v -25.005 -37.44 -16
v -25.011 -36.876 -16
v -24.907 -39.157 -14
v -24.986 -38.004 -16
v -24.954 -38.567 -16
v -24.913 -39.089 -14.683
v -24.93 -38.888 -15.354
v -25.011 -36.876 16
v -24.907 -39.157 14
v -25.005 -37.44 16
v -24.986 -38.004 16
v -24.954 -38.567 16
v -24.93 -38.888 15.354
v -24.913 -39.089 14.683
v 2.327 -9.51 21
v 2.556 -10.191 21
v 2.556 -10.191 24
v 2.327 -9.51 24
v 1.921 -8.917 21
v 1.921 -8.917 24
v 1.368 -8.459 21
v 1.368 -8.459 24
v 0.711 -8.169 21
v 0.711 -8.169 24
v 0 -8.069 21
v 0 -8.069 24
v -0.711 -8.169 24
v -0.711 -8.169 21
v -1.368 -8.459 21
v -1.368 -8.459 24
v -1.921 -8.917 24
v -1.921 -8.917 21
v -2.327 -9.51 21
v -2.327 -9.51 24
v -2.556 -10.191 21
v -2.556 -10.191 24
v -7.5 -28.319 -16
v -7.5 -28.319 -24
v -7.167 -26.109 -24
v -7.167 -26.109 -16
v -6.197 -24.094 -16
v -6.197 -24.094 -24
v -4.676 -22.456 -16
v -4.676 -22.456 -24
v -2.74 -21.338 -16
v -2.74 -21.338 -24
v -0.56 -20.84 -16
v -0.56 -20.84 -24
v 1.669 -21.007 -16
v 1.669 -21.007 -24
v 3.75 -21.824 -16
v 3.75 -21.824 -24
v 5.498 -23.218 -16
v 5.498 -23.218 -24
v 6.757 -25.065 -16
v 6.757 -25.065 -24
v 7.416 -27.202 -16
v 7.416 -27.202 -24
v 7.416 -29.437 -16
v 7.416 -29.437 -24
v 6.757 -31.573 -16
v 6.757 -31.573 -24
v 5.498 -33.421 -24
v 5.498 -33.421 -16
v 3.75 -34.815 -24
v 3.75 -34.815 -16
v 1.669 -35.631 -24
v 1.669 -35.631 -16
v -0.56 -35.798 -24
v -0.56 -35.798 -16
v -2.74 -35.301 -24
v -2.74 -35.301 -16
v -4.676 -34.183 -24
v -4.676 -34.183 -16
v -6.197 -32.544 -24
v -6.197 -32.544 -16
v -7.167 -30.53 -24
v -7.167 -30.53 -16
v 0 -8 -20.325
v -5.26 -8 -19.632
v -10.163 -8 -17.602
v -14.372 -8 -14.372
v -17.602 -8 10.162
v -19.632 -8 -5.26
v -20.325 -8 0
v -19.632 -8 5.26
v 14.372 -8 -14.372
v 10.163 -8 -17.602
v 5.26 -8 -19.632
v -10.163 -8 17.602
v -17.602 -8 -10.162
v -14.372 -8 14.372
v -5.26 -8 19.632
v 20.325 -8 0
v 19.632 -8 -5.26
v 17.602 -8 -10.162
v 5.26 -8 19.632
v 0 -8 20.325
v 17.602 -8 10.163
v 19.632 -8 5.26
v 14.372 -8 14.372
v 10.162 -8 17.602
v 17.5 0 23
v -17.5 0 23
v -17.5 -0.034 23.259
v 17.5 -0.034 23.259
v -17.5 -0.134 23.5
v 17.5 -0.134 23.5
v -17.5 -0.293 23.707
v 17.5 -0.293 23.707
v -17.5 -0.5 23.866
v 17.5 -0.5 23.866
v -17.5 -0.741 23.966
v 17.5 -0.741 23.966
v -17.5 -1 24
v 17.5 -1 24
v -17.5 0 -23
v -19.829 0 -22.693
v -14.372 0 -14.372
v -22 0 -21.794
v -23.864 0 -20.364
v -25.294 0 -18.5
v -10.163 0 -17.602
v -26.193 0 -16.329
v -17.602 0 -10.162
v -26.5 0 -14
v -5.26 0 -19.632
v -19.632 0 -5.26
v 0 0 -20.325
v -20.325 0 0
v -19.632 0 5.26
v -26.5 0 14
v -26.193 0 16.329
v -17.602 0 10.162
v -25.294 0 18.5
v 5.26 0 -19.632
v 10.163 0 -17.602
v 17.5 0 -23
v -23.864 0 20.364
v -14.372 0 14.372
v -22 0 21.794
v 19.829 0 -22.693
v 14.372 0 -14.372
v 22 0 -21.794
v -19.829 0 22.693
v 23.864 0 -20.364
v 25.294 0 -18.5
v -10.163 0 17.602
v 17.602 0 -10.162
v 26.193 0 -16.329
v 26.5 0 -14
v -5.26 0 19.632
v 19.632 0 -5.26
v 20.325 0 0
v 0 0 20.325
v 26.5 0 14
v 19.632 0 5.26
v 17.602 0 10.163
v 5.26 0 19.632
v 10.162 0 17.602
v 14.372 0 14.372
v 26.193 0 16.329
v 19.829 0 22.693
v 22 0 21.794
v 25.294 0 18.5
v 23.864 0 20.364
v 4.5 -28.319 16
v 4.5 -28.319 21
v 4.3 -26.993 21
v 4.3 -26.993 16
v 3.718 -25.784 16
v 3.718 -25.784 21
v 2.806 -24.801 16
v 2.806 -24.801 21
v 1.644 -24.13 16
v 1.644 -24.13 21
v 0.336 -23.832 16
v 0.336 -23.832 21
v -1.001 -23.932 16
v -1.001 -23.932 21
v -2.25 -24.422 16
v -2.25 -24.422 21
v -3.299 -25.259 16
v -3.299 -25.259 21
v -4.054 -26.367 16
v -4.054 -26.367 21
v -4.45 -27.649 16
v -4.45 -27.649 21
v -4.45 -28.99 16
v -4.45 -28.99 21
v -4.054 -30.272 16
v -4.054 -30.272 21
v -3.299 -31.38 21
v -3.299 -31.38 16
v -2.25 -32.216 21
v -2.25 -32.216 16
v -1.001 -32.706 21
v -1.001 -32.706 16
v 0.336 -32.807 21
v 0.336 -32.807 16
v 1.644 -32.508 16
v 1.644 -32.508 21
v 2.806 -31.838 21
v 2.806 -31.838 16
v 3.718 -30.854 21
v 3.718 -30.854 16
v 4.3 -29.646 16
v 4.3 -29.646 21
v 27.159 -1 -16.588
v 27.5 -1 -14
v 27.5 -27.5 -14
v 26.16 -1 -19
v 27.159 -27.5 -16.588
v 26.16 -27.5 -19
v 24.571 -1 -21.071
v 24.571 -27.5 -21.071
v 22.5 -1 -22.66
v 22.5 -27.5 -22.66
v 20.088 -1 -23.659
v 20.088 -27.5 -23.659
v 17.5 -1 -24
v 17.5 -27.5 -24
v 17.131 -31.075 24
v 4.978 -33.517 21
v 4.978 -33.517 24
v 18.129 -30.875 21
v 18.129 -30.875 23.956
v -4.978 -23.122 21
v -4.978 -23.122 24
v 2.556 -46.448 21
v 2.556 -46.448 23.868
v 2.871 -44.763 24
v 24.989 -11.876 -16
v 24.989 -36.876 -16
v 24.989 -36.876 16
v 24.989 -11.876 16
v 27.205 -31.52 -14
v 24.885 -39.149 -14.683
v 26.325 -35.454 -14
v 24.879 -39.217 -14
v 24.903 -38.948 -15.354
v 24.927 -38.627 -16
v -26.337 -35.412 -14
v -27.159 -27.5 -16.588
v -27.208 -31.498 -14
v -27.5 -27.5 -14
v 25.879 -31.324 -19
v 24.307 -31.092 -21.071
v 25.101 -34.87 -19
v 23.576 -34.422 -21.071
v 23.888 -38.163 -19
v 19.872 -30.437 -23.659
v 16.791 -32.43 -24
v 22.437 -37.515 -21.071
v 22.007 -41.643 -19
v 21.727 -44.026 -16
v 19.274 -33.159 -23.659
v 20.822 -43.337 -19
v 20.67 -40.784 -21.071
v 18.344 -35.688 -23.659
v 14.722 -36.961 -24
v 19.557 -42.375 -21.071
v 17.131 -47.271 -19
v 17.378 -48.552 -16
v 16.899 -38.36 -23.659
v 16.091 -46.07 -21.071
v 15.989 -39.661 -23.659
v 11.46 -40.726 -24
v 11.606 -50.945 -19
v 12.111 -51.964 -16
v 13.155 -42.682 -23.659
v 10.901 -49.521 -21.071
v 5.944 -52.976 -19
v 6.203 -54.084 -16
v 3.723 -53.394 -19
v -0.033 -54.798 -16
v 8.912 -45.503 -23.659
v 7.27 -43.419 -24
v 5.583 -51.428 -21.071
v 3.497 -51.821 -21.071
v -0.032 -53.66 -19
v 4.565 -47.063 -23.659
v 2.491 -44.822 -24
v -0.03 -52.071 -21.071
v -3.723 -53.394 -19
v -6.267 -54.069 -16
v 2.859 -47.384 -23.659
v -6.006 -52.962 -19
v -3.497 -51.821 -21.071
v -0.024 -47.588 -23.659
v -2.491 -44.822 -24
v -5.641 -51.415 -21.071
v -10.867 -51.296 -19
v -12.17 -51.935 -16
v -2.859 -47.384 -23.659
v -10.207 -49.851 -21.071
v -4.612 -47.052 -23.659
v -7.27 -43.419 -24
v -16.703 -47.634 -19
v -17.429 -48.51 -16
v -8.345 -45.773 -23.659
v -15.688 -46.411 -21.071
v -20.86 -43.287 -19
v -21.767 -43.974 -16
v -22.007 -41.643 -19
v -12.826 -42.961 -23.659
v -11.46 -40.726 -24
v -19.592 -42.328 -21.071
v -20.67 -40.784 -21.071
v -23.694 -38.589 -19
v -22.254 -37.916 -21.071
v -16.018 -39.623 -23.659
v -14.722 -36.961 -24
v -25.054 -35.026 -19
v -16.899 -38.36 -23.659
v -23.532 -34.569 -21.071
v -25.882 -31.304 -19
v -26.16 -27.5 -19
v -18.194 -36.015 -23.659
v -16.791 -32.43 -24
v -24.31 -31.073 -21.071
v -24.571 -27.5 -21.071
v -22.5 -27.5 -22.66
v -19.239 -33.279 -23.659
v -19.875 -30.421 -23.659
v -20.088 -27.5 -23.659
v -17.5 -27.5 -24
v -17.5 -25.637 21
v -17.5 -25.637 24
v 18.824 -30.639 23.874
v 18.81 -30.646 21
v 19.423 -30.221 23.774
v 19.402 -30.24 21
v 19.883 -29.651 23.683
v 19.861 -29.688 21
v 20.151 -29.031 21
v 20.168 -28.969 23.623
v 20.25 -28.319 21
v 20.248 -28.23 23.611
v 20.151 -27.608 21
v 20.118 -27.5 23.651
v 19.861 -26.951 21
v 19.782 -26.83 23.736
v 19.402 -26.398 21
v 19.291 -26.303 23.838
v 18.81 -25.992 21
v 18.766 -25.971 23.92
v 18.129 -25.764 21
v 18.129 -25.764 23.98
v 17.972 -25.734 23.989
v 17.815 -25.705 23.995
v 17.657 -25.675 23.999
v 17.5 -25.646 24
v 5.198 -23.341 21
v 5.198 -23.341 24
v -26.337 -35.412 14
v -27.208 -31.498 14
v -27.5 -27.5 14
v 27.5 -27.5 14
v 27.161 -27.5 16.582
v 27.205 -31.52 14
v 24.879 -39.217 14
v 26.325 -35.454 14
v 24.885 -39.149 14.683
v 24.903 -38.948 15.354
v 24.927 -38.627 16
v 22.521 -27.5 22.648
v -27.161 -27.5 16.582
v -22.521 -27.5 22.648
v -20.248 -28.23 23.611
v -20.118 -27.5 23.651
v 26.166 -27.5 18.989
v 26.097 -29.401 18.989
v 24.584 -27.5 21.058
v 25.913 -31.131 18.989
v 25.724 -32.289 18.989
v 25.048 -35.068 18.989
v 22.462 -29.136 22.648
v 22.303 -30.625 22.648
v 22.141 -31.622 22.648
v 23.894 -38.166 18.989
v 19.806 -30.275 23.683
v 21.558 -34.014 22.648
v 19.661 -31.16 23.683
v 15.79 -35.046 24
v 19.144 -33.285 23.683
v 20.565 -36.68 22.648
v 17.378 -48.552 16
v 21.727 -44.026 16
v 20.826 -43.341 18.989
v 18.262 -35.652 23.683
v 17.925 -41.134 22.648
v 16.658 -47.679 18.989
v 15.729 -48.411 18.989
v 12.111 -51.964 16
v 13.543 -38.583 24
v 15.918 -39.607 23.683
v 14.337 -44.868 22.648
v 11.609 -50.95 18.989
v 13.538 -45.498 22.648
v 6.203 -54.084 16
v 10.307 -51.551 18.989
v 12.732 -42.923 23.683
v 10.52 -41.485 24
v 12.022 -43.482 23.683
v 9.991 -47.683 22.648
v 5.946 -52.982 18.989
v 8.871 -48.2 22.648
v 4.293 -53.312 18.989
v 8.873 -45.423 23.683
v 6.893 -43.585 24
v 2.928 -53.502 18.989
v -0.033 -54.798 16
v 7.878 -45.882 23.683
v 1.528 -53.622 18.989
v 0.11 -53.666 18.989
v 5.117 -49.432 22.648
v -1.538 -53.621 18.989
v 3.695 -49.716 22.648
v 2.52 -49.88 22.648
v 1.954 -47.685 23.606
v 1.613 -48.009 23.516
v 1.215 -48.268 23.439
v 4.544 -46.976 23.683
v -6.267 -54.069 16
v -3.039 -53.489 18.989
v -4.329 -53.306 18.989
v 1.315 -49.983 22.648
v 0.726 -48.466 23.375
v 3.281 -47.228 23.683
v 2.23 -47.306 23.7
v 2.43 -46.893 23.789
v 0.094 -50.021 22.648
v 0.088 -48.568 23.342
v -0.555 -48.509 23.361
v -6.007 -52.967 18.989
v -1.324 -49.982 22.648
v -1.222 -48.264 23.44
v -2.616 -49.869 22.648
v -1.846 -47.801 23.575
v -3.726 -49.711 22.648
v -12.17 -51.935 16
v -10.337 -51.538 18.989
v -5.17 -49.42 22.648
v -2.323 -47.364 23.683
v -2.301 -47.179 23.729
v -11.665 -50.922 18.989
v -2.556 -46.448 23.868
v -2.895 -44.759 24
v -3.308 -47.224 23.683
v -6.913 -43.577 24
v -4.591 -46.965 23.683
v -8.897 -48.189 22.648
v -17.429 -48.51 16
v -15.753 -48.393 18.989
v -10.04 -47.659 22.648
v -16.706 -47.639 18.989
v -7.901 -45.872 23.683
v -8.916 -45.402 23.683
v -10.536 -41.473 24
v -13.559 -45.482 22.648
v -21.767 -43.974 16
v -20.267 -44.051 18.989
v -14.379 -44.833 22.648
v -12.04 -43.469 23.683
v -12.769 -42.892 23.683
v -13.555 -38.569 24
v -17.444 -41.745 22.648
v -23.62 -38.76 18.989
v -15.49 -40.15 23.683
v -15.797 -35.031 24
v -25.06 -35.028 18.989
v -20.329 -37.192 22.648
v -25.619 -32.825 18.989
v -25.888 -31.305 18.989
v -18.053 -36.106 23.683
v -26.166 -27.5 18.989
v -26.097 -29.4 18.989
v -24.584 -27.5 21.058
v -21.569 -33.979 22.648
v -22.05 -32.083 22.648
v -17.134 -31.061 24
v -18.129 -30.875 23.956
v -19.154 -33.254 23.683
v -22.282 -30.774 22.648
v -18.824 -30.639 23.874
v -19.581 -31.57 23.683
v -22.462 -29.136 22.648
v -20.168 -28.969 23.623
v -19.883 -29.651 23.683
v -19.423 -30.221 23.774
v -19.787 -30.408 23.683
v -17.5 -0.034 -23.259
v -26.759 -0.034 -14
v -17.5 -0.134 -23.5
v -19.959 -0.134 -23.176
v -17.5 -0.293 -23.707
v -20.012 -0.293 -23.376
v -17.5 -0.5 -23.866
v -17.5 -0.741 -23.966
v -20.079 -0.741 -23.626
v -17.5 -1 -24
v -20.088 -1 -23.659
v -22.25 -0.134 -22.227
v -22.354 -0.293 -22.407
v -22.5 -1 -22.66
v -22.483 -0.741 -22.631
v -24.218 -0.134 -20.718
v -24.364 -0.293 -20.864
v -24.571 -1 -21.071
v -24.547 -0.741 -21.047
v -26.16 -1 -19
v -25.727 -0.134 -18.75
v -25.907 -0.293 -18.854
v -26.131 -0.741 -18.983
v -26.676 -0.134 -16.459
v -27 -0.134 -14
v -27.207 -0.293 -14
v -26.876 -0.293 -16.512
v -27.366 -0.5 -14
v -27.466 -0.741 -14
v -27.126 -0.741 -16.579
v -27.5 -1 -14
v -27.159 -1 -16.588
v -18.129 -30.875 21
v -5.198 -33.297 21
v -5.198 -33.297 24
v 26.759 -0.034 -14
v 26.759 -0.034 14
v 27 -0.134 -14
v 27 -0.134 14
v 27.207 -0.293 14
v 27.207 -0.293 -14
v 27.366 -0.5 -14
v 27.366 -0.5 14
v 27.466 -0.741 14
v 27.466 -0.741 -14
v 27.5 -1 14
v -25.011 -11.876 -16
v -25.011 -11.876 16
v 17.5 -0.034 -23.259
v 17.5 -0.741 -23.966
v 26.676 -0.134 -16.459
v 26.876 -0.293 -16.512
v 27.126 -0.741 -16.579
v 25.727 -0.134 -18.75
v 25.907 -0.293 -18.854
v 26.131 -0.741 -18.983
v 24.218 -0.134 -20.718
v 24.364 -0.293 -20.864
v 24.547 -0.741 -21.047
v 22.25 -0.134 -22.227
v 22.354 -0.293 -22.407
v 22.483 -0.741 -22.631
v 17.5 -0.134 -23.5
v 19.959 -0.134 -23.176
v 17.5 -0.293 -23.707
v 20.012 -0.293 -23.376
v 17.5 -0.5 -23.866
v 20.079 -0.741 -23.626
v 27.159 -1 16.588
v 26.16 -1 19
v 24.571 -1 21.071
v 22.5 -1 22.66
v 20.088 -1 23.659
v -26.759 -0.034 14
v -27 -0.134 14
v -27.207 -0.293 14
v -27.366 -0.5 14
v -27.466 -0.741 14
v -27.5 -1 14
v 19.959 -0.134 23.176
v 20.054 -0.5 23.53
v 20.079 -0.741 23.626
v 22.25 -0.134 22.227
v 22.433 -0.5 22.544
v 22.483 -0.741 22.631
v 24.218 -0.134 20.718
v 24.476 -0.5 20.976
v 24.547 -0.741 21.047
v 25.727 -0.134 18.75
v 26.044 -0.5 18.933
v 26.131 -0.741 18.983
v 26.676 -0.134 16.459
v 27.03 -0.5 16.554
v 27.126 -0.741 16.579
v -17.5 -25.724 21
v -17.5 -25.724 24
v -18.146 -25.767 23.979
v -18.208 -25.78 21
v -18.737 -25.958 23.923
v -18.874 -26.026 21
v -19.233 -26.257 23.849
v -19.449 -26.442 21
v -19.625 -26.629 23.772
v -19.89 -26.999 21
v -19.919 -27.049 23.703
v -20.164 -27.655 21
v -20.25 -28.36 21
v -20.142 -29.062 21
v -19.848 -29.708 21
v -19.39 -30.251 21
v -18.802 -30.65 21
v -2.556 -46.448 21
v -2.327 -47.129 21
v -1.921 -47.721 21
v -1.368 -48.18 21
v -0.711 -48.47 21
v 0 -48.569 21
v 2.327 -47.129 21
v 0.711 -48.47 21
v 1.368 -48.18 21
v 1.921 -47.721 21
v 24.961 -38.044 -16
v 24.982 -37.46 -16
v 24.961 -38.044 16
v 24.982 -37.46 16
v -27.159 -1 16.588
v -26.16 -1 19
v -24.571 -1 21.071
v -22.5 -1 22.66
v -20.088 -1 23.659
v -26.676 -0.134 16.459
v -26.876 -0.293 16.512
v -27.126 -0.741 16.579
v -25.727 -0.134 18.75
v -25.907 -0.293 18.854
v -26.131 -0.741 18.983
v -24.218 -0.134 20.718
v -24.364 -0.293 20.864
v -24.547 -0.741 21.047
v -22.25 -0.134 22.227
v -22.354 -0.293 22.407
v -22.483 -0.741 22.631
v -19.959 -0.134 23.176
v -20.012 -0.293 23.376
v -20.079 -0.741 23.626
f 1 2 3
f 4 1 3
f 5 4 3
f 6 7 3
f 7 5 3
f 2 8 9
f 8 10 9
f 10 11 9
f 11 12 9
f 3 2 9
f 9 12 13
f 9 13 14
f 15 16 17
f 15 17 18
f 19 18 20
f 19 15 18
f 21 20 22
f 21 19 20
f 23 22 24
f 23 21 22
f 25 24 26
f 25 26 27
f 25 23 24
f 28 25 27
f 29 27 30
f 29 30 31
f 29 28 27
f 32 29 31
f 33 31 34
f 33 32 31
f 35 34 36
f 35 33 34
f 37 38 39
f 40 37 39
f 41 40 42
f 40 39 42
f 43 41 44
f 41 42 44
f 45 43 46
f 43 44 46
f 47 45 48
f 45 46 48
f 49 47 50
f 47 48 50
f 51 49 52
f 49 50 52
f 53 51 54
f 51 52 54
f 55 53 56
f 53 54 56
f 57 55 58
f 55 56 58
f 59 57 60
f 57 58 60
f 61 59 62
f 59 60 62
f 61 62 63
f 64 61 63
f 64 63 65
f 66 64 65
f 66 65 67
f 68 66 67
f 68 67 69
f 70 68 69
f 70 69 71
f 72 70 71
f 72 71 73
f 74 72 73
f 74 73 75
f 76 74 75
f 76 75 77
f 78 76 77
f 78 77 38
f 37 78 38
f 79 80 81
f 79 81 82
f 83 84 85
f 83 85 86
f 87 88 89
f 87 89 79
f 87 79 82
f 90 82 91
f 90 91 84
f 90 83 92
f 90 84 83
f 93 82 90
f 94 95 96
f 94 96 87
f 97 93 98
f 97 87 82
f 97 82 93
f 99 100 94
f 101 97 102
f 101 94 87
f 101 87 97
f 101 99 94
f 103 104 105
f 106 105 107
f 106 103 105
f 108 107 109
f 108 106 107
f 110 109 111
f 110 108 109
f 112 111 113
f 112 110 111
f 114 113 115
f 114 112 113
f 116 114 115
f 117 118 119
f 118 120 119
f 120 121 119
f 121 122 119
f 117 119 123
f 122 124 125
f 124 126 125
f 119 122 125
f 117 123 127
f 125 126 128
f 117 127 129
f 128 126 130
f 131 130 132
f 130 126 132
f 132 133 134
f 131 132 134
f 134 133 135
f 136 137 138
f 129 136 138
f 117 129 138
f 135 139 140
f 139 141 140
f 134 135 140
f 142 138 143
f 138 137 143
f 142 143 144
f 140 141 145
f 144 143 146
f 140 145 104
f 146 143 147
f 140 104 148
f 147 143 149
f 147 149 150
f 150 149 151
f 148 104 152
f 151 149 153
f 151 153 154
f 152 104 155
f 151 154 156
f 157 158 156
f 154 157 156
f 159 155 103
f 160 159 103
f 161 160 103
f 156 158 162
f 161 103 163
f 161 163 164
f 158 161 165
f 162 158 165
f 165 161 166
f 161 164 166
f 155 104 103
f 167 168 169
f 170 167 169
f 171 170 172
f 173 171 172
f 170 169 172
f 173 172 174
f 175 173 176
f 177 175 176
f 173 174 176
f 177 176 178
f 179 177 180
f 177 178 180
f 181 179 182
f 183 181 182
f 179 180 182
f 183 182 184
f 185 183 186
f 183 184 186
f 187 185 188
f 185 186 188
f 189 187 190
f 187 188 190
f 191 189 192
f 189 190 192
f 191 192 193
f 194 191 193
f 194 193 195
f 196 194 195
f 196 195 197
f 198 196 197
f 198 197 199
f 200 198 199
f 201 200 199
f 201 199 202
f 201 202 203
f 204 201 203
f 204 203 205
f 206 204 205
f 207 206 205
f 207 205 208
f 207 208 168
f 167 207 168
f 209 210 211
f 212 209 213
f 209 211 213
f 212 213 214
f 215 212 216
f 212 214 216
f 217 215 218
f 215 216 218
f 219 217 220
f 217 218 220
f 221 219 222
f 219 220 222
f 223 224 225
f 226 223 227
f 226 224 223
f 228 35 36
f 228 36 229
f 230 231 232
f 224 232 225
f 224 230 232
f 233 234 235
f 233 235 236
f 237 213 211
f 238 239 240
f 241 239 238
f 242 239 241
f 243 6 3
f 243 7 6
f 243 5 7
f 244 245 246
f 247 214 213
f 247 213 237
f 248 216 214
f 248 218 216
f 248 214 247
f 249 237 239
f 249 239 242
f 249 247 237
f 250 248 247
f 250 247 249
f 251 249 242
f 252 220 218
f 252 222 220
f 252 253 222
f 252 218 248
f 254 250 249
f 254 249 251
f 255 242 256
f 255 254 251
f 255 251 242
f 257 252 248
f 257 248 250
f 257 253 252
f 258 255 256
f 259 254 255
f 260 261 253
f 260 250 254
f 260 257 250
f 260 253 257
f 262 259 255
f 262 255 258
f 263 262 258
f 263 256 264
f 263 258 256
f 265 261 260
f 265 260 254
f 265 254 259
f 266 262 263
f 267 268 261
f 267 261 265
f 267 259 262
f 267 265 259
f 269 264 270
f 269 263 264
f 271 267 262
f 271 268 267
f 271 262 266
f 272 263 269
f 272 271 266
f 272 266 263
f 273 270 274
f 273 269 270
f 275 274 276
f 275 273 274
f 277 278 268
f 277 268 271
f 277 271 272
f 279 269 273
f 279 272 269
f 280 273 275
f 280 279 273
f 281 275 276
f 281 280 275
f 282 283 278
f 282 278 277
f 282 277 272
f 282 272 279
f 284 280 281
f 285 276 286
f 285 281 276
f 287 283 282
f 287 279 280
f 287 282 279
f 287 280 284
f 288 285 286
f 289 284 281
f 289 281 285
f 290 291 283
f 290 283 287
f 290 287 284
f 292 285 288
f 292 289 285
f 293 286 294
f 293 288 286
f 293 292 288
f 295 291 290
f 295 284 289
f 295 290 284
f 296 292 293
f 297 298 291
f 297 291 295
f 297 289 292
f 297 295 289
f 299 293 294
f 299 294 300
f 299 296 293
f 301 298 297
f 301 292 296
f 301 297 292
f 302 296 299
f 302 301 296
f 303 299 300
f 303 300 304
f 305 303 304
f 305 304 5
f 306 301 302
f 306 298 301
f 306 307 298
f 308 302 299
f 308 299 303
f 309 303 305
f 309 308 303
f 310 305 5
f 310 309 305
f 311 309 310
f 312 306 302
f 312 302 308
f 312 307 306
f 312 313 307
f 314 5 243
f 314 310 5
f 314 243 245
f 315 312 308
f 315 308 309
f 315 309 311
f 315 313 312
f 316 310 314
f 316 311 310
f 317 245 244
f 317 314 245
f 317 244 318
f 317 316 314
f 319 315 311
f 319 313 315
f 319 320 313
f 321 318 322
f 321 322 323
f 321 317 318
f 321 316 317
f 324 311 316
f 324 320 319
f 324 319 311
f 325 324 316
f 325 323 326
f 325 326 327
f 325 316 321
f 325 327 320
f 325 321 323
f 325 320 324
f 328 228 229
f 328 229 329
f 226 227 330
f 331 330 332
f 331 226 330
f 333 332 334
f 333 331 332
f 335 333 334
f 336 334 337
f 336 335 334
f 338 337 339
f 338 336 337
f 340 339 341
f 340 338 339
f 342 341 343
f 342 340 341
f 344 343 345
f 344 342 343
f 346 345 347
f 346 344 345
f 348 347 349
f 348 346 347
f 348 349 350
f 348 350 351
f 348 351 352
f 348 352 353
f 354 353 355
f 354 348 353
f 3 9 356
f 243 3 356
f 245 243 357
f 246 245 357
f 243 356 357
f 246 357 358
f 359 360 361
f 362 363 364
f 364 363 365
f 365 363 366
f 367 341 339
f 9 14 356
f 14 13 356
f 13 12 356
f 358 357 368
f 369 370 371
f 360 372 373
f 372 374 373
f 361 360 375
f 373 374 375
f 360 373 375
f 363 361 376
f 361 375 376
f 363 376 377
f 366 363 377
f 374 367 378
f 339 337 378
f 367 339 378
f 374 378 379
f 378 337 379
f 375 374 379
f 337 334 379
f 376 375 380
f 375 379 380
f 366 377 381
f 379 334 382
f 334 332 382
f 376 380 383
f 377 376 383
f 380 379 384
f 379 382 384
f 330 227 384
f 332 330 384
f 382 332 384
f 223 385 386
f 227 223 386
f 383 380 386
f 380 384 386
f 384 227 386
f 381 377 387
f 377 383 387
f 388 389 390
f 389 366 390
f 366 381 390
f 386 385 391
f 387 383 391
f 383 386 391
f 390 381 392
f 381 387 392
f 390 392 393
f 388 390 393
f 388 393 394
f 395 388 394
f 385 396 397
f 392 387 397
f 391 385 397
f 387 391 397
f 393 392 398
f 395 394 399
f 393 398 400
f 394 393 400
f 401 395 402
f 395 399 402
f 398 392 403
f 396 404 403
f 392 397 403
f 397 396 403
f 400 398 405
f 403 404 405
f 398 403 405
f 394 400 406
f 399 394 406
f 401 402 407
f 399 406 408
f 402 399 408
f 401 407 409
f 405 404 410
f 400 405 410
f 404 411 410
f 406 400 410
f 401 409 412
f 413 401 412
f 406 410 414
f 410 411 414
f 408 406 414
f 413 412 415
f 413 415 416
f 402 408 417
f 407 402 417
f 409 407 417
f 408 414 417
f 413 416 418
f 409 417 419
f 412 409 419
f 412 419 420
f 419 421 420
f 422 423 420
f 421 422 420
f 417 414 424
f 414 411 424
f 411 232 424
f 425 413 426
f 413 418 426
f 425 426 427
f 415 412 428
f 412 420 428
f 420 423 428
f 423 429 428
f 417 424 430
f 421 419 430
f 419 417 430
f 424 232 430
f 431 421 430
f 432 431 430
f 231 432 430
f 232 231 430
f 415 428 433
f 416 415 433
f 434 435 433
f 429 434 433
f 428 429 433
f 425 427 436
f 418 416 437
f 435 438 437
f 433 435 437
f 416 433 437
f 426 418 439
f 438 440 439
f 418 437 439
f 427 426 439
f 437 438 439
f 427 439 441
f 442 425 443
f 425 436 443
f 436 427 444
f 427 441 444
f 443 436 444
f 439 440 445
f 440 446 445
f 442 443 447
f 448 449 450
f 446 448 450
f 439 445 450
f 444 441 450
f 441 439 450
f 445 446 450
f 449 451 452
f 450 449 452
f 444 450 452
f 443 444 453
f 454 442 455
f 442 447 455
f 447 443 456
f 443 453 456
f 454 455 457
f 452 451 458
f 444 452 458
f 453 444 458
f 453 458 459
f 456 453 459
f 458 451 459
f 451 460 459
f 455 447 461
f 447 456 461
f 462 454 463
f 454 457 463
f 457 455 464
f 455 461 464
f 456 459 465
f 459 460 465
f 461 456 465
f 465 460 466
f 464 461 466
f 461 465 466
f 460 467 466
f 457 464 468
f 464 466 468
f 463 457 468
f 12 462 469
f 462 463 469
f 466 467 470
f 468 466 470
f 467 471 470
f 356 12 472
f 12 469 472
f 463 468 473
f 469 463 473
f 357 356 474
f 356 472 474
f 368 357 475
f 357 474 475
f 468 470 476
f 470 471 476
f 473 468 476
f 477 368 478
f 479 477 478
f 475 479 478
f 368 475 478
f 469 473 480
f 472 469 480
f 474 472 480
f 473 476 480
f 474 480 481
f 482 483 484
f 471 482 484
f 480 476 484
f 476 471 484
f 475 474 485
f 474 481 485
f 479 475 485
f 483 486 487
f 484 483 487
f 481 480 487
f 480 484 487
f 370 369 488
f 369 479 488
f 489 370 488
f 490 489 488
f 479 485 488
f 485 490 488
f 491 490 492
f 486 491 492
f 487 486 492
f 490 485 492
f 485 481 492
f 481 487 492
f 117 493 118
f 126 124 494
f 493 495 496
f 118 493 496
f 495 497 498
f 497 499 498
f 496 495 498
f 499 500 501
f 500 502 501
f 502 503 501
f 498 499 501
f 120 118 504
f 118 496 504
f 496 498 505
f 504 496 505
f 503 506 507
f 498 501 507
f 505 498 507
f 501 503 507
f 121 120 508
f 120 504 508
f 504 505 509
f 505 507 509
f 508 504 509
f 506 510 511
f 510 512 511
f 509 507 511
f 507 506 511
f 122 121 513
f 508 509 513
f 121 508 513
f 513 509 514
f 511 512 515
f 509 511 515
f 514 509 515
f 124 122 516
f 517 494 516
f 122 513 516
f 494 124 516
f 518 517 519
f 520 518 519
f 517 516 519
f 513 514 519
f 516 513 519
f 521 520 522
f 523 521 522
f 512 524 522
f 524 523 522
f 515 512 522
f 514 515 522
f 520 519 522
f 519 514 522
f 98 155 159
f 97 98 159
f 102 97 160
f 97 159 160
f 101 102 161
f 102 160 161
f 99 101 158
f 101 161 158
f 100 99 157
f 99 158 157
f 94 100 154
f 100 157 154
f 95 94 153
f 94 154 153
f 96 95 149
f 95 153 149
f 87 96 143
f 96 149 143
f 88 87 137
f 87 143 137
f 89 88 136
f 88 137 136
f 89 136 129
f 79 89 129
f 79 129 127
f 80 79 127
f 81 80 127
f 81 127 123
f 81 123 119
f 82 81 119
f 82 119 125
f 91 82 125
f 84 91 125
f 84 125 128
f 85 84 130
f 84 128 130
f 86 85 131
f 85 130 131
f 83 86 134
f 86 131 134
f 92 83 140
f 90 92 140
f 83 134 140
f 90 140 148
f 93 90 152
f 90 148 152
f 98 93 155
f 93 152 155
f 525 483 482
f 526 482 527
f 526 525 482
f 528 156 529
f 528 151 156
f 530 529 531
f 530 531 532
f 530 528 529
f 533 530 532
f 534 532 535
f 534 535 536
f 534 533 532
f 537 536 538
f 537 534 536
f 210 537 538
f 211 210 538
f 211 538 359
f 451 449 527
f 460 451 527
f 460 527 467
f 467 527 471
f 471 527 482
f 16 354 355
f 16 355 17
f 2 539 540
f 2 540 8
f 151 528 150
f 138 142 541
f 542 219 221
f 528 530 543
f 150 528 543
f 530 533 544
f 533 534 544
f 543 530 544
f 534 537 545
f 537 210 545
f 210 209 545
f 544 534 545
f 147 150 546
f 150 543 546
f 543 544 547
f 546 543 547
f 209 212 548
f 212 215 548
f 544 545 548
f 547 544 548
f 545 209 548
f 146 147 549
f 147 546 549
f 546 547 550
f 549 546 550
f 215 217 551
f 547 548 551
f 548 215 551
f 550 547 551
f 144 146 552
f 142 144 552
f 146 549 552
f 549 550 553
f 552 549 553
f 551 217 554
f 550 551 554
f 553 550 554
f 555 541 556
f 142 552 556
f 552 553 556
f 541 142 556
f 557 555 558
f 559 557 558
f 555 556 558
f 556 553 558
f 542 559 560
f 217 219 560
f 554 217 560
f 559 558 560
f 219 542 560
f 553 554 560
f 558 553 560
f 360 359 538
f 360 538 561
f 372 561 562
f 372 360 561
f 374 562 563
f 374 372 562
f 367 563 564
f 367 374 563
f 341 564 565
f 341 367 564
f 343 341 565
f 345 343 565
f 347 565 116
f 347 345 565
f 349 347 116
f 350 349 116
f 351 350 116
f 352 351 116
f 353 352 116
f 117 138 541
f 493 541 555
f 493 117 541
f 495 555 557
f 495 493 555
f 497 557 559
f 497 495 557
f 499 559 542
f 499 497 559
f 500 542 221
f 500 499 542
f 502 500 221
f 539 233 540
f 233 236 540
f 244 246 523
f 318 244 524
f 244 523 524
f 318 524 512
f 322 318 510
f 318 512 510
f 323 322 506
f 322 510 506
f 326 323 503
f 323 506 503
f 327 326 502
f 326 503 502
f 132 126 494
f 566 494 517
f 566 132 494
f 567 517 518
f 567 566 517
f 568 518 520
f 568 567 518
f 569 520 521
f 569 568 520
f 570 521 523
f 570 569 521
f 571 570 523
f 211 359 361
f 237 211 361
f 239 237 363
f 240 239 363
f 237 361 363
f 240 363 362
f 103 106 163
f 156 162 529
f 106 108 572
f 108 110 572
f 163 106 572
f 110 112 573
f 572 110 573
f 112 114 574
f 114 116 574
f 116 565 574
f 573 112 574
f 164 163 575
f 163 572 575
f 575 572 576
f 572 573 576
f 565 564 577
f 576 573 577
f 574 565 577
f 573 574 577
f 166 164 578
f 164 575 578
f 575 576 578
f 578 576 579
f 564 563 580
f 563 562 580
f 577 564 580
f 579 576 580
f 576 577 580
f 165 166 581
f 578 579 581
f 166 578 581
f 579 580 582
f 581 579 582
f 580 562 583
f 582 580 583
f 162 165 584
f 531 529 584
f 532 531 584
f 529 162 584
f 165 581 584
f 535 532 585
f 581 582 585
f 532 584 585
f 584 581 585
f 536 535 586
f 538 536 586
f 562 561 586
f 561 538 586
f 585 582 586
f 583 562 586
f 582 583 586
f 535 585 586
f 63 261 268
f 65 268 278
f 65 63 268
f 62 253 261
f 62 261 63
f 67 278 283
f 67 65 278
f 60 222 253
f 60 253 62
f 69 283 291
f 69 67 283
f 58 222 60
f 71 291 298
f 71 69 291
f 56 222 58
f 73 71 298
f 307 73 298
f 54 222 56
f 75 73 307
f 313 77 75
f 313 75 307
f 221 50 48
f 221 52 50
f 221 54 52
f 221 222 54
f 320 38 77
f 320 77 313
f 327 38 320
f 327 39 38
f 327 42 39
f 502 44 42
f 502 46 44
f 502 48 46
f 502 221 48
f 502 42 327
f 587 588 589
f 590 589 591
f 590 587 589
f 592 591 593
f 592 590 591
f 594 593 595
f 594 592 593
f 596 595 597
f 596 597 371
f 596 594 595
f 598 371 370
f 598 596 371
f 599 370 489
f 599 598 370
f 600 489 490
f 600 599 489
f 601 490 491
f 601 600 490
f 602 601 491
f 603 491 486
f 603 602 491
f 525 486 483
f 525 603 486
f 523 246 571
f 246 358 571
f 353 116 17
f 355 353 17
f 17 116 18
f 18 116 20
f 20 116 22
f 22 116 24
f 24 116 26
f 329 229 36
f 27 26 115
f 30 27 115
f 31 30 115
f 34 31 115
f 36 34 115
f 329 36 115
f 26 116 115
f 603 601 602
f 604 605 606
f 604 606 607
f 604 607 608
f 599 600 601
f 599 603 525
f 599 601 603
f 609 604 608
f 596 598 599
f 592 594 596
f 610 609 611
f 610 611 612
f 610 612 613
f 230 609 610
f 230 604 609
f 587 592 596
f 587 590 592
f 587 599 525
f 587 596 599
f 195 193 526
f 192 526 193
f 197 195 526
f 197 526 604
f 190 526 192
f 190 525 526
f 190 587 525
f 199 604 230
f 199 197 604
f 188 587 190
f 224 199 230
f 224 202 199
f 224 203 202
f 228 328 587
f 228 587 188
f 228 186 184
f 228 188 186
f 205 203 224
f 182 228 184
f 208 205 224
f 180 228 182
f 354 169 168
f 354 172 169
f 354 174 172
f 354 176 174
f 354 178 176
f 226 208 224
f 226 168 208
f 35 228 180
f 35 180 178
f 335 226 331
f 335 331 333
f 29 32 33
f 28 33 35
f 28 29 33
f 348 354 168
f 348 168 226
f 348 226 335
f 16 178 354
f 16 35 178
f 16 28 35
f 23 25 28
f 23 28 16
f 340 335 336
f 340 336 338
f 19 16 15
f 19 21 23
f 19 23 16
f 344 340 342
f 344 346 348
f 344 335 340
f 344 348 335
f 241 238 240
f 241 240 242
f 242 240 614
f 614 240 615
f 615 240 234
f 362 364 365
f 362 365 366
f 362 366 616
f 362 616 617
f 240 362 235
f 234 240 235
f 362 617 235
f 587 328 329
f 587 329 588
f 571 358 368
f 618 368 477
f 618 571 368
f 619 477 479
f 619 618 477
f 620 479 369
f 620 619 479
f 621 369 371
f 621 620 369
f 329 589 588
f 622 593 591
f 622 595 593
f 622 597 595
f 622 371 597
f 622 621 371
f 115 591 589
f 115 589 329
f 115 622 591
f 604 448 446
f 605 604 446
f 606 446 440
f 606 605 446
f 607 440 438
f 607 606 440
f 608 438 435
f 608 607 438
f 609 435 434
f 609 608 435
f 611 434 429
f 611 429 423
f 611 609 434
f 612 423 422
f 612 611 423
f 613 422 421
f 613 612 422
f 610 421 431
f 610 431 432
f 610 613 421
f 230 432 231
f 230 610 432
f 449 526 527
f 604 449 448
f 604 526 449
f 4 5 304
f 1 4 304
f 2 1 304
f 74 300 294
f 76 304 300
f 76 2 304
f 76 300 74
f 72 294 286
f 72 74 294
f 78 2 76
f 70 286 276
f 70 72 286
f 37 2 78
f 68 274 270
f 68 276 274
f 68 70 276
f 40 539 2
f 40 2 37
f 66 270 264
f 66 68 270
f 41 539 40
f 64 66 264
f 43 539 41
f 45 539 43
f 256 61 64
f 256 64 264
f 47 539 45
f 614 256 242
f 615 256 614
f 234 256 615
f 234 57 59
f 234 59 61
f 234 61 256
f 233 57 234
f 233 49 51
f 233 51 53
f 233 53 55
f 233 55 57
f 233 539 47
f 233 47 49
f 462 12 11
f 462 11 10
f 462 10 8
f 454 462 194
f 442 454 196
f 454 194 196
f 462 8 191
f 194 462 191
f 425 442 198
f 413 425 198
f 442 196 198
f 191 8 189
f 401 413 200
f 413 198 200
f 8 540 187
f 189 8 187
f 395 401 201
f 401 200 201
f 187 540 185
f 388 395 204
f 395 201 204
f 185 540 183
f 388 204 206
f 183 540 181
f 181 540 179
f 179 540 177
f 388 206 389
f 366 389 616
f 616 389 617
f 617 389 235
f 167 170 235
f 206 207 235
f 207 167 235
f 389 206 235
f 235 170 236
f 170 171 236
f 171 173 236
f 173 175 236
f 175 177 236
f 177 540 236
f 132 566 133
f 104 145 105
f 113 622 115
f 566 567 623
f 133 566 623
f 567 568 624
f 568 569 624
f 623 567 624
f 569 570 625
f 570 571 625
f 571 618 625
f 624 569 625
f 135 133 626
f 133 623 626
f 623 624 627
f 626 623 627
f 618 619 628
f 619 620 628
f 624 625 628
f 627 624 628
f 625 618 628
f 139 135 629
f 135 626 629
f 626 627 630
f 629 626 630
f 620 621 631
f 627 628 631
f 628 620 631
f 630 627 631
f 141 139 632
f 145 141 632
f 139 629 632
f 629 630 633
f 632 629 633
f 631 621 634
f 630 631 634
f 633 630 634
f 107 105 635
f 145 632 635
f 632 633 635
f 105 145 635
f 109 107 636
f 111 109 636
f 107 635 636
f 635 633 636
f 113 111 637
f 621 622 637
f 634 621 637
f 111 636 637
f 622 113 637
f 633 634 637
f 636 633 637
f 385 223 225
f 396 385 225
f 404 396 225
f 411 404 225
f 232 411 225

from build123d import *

# Parameters (mm, degrees)
BOSS_EXTRUDE1_DEPTH = 24
SKETCH3_R           = 20.325
CUT_EXTRUDE1_DEPTH  = 8
FILLET1_R           = 10
FILLET5_R           = 1
CUT_EXTRUDE2_DEPTH  = 16
SKETCH10_R          = 4.5
CUT_EXTRUDE4_DEPTH  = 75
CUT_EXTRUDE5_DEPTH  = 3
SKETCH12_R          = 7.5
CUT_EXTRUDE6_DEPTH  = 10


with BuildPart() as part:
    # Sketch2 → Boss-Extrude1 (new, symmetric)
    with BuildSketch(Plane.XY):
        with BuildLine():
            Line((-27.5, -27.5), (-27.5, 0))
            Line((-27.5, 0), (27.5, 0))
            Line((27.5, 0), (27.5, -27.5))
            ThreePointArc((27.5, -27.5), (0, -55), (-27.5, -27.5))
        make_face()
    extrude(amount=BOSS_EXTRUDE1_DEPTH, both=True)

    # Sketch3 → Cut-Extrude1 (cut)
    with BuildSketch(Plane(origin=(0, 0, 0), x_dir=(1, 0, 0), z_dir=(0, 1, 0))):
        Circle(SKETCH3_R)
    extrude(amount=-CUT_EXTRUDE1_DEPTH, mode=Mode.SUBTRACT)

    # Fillet1
    fillet1_edges = [part.edges().sort_by_distance(p)[0] for p in [
        (27.5, -13.75, -24),
        (0, -55, -24),
        (27.5, -13.75, 24),
        (0, -55, 24),
        (-27.5, -13.75, -24),
        (-27.5, -13.75, 24),
    ]]
    fillet(fillet1_edges, radius=FILLET1_R)

    # Fillet5
    fillet5_edges = [part.edges().sort_by_distance(p)[0] for p in [
        (24.571067812, 0, 21.071067812),
        (0, 0, 24),
        (0, 0, -24),
        (24.571067812, 0, -21.071067812),
        (-24.571067812, 0, 21.071067812),
        (-24.571067812, 0, -21.071067812),
        (27.5, 0, 0),
        (-27.5, 0, 0),
    ]]
    fillet(fillet5_edges, radius=FILLET5_R)

    # Sketch7 → Cut-Extrude2 (cut, symmetric)
    with BuildSketch(Plane.XY):
        with BuildLine():
            Line((-0.011296589, -11.876404256), (-25.011296589, -11.876404256))
            Line((-25.011296589, -11.876404256), (-25.011296589, -36.876404256))
            ThreePointArc((-25.011296589, -36.876404256), (-0.011296589, -61.876404256), (24.988703411, -36.876404256))
            Line((24.988703411, -36.876404256), (24.988703411, -11.876404256))
            Line((24.988703411, -11.876404256), (-0.011296589, -11.876404256))
        make_face()
    extrude(amount=CUT_EXTRUDE2_DEPTH, both=True, mode=Mode.SUBTRACT)

    # Sketch10 → Cut-Extrude4 (cut)
    with BuildSketch(Plane.XY.offset(24)):
        with Locations((0, -28.319318025)):
            Circle(SKETCH10_R)
    extrude(amount=-CUT_EXTRUDE4_DEPTH, mode=Mode.SUBTRACT)

    # Sketch11 → Cut-Extrude5 (cut)
    with BuildSketch(Plane.XY.offset(24)):
        with BuildLine():
            Line((5.197589428, -23.341260326), (2.555542026, -10.190564483))
            ThreePointArc((2.555542026, -10.190564483), (0, -8.069318025), (-2.555542026, -10.190564483))
            Line((-2.555542026, -10.190564483), (-4.978057698, -23.121728597))
            Line((-4.978057698, -23.121728597), (-17.5, -25.637455941))
            Line((-17.5, -25.637455941), (-17.5, -25.723648554))
            ThreePointArc((-17.5, -25.723648554), (-20.230845732, -28.004301665), (-18.128753541, -30.874860051))
            Line((-18.128753541, -30.874860051), (-5.197589428, -33.297375723))
            Line((-5.197589428, -33.297375723), (-2.555542026, -46.448071566))
            ThreePointArc((-2.555542026, -46.448071566), (0, -48.569318025), (2.555542026, -46.448071566))
            Line((2.555542026, -46.448071566), (4.978057698, -33.516907452))
            Line((4.978057698, -33.516907452), (18.128753541, -30.874860051))
            ThreePointArc((18.128753541, -30.874860051), (20.25, -28.319318025), (18.128753541, -25.763775998))
            Line((18.128753541, -25.763775998), (5.197589428, -23.341260326))
        make_face()
    extrude(amount=-CUT_EXTRUDE5_DEPTH, mode=Mode.SUBTRACT)

    # Sketch12 → Cut-Extrude6 (cut)
    with BuildSketch(Plane(origin=(0, 0, -24), x_dir=(-1, 0, 0), z_dir=(0, 0, -1))):
        with Locations((0, -28.319318025)):
            Circle(SKETCH12_R)
    extrude(amount=-CUT_EXTRUDE6_DEPTH, mode=Mode.SUBTRACT)


solid = part.part
